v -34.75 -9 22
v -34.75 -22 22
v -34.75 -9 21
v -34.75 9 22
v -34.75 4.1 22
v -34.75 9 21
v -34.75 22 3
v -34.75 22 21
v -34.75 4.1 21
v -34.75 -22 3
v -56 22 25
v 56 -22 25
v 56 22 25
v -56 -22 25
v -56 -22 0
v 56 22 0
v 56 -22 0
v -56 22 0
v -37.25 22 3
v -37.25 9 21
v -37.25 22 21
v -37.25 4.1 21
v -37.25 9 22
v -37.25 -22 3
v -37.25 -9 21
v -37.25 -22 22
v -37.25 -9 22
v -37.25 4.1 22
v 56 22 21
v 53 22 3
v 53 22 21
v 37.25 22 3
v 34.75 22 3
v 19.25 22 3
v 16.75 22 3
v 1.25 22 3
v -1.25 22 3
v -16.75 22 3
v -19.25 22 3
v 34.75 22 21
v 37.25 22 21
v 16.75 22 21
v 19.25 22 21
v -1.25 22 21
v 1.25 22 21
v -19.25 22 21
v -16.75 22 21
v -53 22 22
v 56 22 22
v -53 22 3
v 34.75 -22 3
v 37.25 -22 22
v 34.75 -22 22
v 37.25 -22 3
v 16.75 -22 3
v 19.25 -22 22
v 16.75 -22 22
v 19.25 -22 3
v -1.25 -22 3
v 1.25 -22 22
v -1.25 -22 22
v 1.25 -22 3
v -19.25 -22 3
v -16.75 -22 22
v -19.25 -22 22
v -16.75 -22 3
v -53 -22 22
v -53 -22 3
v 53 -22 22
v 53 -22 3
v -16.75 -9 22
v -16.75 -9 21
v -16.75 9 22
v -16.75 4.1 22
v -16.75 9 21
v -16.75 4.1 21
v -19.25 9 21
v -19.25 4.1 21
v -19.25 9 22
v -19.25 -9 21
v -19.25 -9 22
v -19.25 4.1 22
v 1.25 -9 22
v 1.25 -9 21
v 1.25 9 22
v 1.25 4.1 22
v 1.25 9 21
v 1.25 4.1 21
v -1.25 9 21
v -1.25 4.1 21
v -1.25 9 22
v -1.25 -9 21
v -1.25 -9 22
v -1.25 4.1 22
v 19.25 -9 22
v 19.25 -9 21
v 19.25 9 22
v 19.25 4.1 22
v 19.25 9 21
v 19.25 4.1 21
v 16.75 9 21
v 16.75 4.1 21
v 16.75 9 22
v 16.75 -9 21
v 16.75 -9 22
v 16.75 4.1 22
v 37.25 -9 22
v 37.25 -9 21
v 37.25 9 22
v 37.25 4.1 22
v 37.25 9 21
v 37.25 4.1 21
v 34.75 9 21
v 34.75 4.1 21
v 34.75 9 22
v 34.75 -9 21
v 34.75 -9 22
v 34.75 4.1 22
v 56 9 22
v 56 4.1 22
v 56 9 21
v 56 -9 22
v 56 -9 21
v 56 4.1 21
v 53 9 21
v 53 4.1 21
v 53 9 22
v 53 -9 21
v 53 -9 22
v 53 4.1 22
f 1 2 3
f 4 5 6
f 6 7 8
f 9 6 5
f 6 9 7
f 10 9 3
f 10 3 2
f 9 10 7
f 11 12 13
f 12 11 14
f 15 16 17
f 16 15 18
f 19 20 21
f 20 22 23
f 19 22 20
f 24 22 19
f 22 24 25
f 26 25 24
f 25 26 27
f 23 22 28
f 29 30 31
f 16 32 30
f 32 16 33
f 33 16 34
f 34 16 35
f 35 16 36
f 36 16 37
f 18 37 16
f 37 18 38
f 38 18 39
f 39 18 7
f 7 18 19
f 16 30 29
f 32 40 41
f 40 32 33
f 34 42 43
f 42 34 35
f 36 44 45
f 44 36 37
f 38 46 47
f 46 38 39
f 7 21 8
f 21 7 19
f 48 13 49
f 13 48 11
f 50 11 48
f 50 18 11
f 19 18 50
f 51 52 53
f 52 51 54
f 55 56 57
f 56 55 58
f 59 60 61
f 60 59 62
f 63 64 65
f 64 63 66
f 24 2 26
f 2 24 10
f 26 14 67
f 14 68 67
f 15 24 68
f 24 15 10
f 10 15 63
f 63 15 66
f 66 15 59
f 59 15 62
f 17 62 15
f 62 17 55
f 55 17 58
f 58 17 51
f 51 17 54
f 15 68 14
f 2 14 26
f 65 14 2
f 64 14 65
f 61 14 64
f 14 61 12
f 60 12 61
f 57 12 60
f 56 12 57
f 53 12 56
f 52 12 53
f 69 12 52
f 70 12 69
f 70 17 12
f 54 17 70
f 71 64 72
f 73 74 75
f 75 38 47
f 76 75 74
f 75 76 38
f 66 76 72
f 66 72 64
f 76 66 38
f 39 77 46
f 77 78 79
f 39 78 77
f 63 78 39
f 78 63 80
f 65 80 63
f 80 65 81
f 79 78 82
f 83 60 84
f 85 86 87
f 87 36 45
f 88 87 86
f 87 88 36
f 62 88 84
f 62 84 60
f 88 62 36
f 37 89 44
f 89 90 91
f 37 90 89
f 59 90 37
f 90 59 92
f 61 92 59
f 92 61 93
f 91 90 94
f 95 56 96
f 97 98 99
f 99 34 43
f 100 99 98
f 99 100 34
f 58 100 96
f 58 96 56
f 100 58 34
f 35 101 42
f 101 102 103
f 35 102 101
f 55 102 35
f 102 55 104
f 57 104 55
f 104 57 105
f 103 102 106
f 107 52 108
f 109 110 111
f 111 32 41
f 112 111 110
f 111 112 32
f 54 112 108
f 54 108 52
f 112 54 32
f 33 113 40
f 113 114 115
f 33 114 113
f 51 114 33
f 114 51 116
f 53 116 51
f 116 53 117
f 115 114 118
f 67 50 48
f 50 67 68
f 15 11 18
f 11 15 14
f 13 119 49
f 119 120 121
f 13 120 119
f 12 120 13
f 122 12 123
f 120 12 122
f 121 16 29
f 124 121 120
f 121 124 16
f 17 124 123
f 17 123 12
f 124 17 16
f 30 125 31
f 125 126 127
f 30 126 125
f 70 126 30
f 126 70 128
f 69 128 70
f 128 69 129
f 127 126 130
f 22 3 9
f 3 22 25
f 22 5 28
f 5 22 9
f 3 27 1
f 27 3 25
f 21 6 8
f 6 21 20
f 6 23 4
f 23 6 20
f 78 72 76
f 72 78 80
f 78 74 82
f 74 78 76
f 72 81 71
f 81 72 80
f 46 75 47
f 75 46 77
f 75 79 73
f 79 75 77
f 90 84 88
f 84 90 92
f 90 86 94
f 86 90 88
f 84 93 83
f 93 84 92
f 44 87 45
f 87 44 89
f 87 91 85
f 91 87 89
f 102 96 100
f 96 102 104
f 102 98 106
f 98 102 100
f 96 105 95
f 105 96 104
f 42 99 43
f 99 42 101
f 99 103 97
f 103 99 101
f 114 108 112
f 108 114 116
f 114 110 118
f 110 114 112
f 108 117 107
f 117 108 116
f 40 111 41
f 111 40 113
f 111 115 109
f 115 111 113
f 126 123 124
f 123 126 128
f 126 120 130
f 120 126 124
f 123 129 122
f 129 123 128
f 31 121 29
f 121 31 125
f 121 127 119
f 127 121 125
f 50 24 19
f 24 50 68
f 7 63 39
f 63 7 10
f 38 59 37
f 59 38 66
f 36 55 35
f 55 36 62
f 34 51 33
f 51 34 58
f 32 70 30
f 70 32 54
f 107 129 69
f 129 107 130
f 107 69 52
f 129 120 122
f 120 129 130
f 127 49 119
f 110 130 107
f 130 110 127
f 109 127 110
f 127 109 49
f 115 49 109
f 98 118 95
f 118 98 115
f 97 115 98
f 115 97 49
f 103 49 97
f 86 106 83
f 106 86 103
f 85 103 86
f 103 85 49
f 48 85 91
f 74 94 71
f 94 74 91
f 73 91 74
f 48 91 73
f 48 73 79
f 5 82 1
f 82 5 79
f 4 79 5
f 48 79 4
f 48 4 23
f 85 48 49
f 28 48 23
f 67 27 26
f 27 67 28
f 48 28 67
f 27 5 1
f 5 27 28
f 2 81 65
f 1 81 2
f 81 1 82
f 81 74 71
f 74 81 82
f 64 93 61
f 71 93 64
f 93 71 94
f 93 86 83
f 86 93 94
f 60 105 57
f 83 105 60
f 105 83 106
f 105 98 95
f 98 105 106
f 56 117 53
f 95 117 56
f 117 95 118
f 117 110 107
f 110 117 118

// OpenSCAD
// --- Dimensions ---
base_width_x = 112;          // Total width of the base plate (X)
base_depth_y = 44;           // Total depth of the base plate (Y)
base_thickness = 3;          // Thickness of the base plate (Z)

deck_width_x = 112;           // Total width of the deck plate (X)
deck_depth_y = 44;           // Total depth of the deck plate (Y)
deck_thickness = 3;          // Thickness of the deck plate (Z)
deck_z_bottom = 22;          // Z-coordinate of the bottom of the deck
deck_z_top = 25;             // Z-coordinate of the top of the deck

end_wall_thickness = 3;      // Thickness of the two end walls
rib_thickness = 2.5;         // Thickness of the five internal ribs
wall_height = 25;            // Total height of the walls (Z)

hole_size = 13;              // Dimension of the square cuvette holes
hole_spacing_x = 18;         // Center-to-center spacing along X
hole_spacing_y = 18;         // Center-to-center spacing along Y
rows = 2;                    // Number of rows along Y
cols = 6;                    // Number of columns along X

// --- Constants ---
$fn = 64;

// --- Helper Modules ---

// Function to calculate the center of the hole grid to ensure it is centered on the deck
// The grid is (cols-1)*spacing_x wide and (rows-1)*spacing_y deep.
// We calculate the offset to center this grid on the origin.
function get_hole_x(col_idx) = (col_idx - (cols - 1) / 2) * hole_spacing_x;
function get_hole_y(row_idx) = (row_idx - (rows - 1) / 2) * hole_spacing_y;

// --- Main Construction ---

union() {
    // 1. Base Plate
    translate([-base_width_x/2, -base_depth_y/2, 0])
        cube([base_width_x, base_depth_y, base_thickness]);

    // 2. Deck Plate
    translate([-deck_width_x/2, -deck_depth_y/2, deck_z_bottom])
        cube([deck_width_x, deck_depth_y, deck_thickness]);

    // 3. Vertical Walls and Ribs
    difference() {
        // The solid structure of the walls
        union() {
            // Two end walls (flush with short ends)
            translate([-base_width_x/2, -base_depth_y/2, 0])
                cube([end_wall_thickness, base_depth_y, wall_height]);
            
            translate([base_width_x/2 - end_wall_thickness, -base_depth_y/2, 0])
                cube([end_wall_thickness, base_depth_y, wall_height]);

            // Five internal ribs
            // Rib positions: -36, -18, 0, 18, 36
            for (rx = [-36, -18, 0, 18, 36]) {
                translate([rx - rib_thickness/2, -base_depth_y/2, 0])
                    cube([rib_thickness, base_depth_y, wall_height]);
            }
        }

        // 4. The 12 Square Through-Holes in the Deck
        // We only subtract from the deck plate area.
        // To ensure clean cuts, we use a slightly larger cube for the subtraction.
        for (i = [0 : cols - 1]) {
            for (j = [0 : rows - 1]) {
                translate([get_hole_x(i), get_hole_y(j), deck_z_bottom - 1])
                    cube([hole_size + 0.1, hole_size + 0.1, deck_thickness + 2]);
            }
        }
    }
}

// Note: The design is open-sided (front and back) as requested.
// The holes are cut through the deck plate.
// The walls are continuous from Z=0 to Z=25.
